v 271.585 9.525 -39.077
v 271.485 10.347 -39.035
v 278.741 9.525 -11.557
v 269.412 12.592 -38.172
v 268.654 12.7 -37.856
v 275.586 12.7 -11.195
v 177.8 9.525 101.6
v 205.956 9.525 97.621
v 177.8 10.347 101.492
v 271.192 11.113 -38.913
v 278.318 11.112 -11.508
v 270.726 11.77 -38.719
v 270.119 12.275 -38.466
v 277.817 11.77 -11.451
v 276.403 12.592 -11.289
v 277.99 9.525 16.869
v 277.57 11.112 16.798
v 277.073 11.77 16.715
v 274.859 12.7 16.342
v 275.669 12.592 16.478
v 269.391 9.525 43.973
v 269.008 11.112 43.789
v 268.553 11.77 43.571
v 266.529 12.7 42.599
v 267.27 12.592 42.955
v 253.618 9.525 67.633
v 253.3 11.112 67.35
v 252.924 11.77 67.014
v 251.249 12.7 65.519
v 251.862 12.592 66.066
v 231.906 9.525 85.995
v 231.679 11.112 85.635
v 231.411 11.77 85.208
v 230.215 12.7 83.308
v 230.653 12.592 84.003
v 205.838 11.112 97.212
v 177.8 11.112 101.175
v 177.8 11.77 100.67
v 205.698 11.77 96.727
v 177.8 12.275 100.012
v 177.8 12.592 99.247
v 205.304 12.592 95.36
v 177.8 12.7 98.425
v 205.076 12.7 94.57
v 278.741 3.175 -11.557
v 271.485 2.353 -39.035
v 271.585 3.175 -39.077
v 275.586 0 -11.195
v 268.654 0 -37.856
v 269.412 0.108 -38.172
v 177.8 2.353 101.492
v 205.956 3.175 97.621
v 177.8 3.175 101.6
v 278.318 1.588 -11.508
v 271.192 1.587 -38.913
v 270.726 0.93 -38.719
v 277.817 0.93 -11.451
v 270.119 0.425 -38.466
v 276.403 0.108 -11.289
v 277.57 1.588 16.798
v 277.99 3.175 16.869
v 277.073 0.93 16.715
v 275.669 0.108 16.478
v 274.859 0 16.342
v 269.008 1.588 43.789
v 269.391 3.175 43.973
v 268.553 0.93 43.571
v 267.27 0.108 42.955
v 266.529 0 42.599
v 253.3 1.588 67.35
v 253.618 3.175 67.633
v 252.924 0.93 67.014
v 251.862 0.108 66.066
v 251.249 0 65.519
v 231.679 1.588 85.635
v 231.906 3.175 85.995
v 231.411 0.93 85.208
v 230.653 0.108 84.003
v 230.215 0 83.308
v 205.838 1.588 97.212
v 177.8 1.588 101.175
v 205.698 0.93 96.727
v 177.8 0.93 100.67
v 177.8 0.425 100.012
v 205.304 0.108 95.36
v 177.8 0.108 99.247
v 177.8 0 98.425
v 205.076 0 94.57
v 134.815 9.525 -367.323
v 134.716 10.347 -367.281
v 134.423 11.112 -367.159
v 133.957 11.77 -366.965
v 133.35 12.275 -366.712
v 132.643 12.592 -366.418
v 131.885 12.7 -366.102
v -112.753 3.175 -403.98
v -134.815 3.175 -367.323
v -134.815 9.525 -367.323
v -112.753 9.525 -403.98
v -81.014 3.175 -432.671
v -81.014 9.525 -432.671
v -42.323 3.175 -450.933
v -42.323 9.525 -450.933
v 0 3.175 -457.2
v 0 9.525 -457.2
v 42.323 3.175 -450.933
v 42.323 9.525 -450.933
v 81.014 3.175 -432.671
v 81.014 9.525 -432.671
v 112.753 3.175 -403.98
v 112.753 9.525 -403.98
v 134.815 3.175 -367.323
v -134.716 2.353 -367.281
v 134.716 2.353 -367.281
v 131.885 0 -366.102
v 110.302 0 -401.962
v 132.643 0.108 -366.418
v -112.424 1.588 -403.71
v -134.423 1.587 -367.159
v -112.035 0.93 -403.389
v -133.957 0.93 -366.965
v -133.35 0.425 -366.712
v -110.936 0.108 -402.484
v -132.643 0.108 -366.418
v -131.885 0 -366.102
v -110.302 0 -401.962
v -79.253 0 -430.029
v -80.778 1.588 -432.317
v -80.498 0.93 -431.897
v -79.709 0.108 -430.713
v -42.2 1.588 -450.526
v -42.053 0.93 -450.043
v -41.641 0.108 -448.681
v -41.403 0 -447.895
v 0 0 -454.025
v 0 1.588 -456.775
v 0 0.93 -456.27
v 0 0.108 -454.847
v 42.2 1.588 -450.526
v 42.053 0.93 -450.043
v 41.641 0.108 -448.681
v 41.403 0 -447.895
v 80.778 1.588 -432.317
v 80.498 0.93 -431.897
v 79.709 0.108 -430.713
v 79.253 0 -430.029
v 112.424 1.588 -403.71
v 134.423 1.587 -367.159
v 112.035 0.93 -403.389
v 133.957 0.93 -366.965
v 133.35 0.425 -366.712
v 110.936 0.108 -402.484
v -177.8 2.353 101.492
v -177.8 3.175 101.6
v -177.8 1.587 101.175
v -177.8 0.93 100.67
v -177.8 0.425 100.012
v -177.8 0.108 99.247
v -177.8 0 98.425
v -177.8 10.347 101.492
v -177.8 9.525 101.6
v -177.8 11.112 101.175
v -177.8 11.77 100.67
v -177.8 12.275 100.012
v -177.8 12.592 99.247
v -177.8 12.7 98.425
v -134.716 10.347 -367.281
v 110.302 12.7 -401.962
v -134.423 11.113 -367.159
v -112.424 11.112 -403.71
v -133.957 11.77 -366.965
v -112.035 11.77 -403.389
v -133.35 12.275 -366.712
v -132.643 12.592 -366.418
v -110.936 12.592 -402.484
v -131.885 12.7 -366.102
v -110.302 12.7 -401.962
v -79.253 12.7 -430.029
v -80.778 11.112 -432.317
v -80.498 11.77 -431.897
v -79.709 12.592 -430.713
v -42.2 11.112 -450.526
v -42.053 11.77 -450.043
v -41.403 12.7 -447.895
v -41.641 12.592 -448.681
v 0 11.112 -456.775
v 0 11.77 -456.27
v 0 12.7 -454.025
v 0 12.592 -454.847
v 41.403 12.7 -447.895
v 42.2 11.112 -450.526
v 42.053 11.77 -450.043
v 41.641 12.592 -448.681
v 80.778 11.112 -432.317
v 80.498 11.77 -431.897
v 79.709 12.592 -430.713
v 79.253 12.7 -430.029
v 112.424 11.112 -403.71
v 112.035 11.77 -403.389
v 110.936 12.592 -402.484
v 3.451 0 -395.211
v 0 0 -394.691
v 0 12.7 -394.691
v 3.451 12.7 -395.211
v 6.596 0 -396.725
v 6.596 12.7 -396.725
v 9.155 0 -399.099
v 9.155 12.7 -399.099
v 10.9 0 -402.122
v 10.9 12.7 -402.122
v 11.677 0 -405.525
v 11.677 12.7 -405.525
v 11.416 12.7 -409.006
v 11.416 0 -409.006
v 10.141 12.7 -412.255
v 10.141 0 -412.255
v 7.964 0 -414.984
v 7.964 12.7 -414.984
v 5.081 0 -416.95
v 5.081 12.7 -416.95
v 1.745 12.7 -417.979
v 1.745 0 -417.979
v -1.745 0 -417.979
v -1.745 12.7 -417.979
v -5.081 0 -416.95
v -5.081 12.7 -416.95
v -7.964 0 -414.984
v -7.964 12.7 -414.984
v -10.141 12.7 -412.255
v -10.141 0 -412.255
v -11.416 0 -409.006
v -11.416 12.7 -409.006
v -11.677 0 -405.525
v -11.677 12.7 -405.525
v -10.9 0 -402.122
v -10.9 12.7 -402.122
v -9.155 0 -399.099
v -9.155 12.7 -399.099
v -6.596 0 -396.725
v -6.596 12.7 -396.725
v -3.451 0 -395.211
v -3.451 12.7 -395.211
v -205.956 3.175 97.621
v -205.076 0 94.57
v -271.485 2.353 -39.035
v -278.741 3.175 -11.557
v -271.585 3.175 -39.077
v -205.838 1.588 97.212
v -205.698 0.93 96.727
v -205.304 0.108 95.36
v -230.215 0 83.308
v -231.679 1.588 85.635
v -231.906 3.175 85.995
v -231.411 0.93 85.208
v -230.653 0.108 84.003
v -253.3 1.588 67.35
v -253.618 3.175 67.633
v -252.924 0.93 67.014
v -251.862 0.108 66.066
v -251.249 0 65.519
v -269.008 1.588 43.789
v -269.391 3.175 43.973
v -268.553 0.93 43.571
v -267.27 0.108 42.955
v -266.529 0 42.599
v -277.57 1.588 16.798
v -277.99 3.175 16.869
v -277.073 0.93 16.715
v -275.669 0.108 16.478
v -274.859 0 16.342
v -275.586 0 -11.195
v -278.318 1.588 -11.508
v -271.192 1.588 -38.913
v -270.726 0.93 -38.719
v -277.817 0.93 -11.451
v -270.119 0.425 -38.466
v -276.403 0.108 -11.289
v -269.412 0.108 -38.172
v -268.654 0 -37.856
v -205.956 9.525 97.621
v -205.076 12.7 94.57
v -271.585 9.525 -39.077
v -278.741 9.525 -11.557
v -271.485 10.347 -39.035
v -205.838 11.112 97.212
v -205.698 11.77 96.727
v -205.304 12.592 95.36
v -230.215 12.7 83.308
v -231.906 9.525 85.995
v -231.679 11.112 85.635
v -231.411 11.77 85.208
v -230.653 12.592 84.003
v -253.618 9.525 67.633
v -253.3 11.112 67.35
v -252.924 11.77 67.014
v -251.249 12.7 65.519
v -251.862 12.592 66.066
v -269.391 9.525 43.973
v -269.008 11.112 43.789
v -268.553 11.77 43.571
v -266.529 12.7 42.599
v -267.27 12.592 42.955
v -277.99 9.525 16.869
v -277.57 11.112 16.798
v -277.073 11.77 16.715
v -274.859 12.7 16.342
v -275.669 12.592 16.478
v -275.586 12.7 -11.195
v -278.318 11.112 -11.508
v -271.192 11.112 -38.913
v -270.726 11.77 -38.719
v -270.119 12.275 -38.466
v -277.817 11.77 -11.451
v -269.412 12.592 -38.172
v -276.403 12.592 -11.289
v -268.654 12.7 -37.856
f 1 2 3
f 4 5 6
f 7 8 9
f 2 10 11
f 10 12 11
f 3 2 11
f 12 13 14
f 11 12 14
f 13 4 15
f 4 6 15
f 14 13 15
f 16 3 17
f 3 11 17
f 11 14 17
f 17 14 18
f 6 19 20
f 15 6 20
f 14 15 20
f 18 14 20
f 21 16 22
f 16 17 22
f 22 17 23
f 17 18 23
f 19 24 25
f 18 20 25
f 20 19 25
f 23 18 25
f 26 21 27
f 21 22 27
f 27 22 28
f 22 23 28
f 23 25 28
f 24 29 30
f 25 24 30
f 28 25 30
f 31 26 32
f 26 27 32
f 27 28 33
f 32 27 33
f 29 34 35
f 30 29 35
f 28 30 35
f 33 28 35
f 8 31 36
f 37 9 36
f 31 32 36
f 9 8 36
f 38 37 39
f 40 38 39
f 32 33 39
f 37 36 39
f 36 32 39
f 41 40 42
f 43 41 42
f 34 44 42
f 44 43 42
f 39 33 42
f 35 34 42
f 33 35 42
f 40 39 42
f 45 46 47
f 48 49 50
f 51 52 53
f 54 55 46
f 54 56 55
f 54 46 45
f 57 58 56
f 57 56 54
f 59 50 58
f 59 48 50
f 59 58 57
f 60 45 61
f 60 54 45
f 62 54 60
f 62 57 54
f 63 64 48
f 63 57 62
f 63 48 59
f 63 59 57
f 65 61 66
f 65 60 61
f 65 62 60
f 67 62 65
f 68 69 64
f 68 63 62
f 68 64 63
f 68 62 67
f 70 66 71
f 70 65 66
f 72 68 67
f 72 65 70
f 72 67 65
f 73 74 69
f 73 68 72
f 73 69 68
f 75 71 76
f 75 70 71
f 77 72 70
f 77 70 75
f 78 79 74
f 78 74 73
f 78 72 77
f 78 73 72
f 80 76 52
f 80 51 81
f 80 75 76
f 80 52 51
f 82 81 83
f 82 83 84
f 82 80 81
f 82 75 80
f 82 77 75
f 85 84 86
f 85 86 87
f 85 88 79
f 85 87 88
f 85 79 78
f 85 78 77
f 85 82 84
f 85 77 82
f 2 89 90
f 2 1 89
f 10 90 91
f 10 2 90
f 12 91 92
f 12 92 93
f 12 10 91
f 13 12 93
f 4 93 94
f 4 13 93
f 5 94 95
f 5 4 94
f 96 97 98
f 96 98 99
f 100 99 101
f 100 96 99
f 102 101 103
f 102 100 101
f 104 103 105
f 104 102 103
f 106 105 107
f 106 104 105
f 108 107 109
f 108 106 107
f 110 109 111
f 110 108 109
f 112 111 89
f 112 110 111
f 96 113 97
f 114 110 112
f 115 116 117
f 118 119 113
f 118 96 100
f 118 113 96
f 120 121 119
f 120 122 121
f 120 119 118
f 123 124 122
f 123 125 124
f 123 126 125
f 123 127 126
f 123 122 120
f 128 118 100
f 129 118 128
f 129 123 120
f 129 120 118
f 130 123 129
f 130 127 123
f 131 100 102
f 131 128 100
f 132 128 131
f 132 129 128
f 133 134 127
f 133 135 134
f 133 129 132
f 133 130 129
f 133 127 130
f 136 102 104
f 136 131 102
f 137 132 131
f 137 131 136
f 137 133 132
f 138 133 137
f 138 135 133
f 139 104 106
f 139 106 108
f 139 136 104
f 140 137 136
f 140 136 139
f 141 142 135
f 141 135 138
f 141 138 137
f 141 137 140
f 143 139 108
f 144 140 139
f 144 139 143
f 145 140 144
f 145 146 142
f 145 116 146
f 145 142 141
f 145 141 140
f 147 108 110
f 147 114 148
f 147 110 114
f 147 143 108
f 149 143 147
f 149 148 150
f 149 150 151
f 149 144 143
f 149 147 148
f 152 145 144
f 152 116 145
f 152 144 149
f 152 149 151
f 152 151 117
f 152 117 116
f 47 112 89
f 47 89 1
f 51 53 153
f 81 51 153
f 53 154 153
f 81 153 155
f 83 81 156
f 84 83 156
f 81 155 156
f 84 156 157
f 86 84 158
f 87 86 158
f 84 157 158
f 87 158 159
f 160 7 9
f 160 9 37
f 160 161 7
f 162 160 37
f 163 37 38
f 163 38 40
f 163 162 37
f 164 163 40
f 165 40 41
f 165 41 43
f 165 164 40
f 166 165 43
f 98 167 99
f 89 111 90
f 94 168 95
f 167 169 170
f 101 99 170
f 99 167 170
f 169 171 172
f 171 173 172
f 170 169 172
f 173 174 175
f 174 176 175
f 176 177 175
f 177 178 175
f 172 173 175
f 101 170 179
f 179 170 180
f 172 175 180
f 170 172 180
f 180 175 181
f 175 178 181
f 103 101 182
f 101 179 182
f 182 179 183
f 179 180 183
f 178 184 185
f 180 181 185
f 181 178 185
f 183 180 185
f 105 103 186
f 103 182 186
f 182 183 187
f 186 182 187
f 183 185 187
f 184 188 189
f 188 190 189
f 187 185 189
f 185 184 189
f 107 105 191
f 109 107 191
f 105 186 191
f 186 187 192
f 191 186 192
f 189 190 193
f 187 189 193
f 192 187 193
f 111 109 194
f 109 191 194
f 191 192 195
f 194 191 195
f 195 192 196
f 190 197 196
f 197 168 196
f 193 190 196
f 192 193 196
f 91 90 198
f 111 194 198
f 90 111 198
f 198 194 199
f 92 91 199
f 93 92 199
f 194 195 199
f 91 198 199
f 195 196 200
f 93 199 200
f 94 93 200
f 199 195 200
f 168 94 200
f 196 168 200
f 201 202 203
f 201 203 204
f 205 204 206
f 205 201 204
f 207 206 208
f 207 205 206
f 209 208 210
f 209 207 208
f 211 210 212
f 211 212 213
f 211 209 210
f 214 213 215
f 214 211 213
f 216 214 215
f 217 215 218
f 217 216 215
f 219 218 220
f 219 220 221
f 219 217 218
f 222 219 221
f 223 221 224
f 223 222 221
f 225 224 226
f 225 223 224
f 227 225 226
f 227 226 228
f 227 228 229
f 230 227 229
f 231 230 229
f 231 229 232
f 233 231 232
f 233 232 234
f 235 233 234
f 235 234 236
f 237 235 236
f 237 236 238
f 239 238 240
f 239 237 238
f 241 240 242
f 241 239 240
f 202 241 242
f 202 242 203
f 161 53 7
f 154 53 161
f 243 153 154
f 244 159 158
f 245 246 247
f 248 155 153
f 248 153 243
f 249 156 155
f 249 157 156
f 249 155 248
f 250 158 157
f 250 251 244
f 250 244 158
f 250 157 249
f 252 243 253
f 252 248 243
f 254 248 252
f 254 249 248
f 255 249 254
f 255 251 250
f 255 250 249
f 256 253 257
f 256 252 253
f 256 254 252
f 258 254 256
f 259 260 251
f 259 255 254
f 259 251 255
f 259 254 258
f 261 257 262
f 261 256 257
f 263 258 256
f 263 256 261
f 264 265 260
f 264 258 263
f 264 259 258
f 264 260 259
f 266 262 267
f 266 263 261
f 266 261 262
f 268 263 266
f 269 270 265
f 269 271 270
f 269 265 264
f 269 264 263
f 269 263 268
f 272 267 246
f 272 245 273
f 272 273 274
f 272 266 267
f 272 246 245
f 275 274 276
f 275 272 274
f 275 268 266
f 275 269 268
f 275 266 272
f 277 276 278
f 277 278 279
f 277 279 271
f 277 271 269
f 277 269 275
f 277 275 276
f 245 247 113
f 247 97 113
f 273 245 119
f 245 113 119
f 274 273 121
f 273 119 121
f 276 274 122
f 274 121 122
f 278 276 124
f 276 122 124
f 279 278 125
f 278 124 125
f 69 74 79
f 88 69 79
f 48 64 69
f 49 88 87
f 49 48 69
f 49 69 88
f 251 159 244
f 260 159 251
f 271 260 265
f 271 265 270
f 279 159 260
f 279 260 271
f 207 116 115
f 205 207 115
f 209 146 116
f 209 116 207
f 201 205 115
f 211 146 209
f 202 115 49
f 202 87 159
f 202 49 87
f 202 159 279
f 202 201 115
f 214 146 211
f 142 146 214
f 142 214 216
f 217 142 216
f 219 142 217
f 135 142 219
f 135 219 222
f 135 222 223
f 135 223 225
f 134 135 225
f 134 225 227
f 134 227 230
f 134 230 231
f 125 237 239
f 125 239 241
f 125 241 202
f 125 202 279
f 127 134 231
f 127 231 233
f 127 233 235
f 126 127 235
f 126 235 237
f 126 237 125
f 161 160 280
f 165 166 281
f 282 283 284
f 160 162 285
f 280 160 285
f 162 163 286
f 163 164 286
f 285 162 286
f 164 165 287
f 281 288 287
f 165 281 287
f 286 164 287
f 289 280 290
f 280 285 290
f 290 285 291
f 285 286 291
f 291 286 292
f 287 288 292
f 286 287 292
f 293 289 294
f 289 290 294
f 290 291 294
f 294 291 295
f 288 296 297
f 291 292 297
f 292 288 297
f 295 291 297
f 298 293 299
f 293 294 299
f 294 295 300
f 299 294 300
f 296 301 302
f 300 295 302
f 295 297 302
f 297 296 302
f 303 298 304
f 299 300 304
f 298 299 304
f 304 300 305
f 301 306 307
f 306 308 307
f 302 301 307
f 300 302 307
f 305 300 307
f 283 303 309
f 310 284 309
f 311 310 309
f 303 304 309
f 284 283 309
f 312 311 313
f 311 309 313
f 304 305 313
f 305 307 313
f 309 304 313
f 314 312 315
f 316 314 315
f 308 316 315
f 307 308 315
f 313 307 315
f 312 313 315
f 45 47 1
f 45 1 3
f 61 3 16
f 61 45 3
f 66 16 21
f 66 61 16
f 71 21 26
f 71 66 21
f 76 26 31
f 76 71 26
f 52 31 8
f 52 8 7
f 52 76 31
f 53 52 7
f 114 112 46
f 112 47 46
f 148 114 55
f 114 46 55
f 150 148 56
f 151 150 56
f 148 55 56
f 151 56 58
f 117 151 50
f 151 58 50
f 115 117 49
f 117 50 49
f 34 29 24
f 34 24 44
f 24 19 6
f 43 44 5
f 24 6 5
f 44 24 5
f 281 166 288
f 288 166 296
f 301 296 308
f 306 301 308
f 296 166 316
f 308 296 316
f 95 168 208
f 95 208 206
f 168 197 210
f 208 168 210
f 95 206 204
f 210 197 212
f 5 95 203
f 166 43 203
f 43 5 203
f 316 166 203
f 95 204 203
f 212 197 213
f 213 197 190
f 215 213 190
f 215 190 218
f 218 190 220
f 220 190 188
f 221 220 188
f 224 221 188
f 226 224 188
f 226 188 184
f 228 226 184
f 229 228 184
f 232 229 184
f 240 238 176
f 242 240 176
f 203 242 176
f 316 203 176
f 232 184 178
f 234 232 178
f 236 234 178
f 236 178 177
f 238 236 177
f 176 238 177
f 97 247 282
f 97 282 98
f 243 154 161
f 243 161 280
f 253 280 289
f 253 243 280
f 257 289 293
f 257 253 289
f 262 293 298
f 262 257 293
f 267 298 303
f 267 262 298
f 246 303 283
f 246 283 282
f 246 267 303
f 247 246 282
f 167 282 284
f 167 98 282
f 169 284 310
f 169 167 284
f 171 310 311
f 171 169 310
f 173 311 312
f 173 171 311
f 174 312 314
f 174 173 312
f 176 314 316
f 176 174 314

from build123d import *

# Parameters (mm, degrees)
SKETCH1_R           = 11.7094
BOSS_EXTRUDE1_DEPTH = 12.7
FILLET2_R           = 3.175
FILLET3_R           = 3.175


with BuildPart() as part:
    # Sketch1 → Boss-Extrude1 (new body)
    with BuildSketch(Plane(origin=(0, 0, 0), x_dir=(1, 0, 0), z_dir=(0, 1, 0))):
        with BuildLine():
            Line((134.815384615, 367.323076923), (271.584615385, 39.076923077))
            ThreePointArc((271.584615385, 39.076923077), (262.336309905, -56.357539936), (177.8, -101.6))
            Line((177.8, -101.6), (-177.8, -101.6))
            ThreePointArc((-177.8, -101.6), (-262.336309905, -56.357539936), (-271.584615385, 39.076923077))
            Line((-271.584615385, 39.076923077), (-134.815384615, 367.323076923))
            ThreePointArc((-134.815384615, 367.323076923), (0, 457.2), (134.815384615, 367.323076923))
        make_face()
        with Locations(Location((0, 406.4, 0), (0, 0, 270))):
            Circle(SKETCH1_R, mode=Mode.SUBTRACT)
    extrude(amount=BOSS_EXTRUDE1_DEPTH)

    # Fillet2
    fillet2_edges = [part.edges().sort_by_distance(p)[0] for p in [
        (-262.336309905, 12.7, 56.357539936),
        (0, 12.7, 101.6),
        (262.336309905, 12.7, 56.357539936),
        (203.2, 12.7, -203.2),
        (0, 12.7, -457.2),
        (-203.2, 12.7, -203.2),
    ]]
    fillet(fillet2_edges, radius=FILLET2_R)

    # Fillet3
    fillet3_edges = [part.edges().sort_by_distance(p)[0] for p in [
        (203.2, 0, -203.2),
        (262.336309905, 0, 56.357539936),
        (0, 0, 101.6),
        (-262.336309905, 0, 56.357539936),
        (-203.2, 0, -203.2),
        (0, 0, -457.2),
    ]]
    fillet(fillet3_edges, radius=FILLET3_R)


solid = part.part
